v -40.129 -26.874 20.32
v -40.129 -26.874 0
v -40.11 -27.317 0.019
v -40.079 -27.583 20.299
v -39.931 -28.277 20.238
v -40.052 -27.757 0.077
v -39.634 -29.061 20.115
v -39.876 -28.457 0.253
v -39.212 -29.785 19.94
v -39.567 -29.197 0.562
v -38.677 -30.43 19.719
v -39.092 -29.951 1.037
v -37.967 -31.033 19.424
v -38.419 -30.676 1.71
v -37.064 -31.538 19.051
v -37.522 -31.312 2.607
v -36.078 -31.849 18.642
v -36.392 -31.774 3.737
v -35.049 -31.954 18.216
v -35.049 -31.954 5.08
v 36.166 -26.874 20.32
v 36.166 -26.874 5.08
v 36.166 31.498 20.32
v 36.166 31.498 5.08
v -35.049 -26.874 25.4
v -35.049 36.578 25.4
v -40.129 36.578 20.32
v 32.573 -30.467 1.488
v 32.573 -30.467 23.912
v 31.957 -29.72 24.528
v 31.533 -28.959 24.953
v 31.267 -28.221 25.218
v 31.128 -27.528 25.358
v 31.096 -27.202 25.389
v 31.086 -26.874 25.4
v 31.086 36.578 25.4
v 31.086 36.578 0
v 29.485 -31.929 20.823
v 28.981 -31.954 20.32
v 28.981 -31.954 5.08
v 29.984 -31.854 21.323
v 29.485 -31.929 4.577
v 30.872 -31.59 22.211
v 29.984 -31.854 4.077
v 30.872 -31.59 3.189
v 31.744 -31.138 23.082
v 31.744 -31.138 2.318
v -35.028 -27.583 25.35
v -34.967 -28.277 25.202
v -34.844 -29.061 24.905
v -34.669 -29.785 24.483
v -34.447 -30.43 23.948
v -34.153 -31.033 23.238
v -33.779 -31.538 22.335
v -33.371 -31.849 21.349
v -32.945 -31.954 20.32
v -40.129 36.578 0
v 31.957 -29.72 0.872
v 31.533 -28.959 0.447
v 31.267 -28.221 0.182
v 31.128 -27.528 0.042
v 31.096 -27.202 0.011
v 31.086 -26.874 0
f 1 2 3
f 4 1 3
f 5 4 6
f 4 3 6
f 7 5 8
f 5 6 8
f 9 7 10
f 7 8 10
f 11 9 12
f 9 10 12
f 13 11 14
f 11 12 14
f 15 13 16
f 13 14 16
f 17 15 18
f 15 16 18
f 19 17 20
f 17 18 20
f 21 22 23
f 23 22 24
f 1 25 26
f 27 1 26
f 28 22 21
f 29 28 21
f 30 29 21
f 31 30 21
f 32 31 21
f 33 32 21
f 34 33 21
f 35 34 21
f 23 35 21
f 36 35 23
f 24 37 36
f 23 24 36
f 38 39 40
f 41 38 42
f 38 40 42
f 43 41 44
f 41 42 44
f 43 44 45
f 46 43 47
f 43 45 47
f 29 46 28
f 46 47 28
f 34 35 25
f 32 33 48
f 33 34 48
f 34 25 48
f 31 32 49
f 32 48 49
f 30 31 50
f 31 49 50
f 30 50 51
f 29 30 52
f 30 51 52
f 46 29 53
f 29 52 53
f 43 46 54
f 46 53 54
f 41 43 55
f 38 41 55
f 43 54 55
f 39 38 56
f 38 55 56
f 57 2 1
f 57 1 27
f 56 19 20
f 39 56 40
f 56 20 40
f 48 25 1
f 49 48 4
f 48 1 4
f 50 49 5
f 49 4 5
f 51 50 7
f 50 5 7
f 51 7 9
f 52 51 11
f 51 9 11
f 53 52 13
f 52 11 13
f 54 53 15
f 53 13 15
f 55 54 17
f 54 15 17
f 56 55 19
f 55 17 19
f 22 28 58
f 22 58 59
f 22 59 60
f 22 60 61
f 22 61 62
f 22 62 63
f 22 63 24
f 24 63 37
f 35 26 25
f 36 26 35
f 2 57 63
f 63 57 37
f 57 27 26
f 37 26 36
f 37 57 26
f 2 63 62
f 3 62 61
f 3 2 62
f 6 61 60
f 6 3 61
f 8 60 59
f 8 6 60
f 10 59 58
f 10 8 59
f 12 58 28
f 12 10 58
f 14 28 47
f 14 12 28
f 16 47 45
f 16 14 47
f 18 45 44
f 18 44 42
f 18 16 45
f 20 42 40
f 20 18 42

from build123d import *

# Parameters (mm, degrees)
F0_W        = 76.2943662703
F0_H        = 68.5328170657
F1_DEPTH    = 25.4
F2_SIZE     = 5.08
F3_T1_DEPTH = 45.72
F3_T3_DEPTH = 32.5842048969
F3_T5_DEPTH = 96.6143662703
F3_T7_DEPTH = 91.5343662703
F3_T9_DEPTH = 35.9210244843


# Not quite as in the source:
# - a fillet or chamfer that OpenCascade refuses, or shapes differently, is made with other operations: its cross-section is extruded or revolved along the edge and cut away or added


with BuildPart() as f1:
    # F0 (on Top) → F1 (new body)
    with BuildSketch(Plane.XY):
        with Locations((-1.9816737622, 2.3119486868)):
            Rectangle(F0_W, F0_H)
    extrude(amount=F1_DEPTH)

    # F2
    f2_edges = [f1.edges().sort_by_distance(p)[0] for p in [
        (36.165509, -31.95446, 12.7),
        (36.165509, 36.578357, 12.7),
        (36.165509, 2.311949, 0),
        (36.165509, 2.311949, 25.4),
        (-40.128857, 2.311949, 25.4),
    ]]
    chamfer(f2_edges, length=F2_SIZE)

    # F3: fillet of radius 5.08 on 5 edges, made by hand

    # F3_s2 → F3_t1 (cut)
    with BuildSketch(Plane.XY.offset(-12.7)):
        with BuildLine():
            ThreePointArc((-40.1288568974, -26.874459846), (-38.6409593458, -30.4665622944), (-35.0488568974, -31.954459846))
            Line((-35.0488568974, -31.954459846), (-40.1288568974, -31.954459846))
            Line((-40.1288568974, -31.954459846), (-40.1288568974, -26.874459846))
        make_face()
    extrude(amount=F3_T1_DEPTH, mode=Mode.SUBTRACT)

    # F3_s4 → F3_t3 (cut)
    with BuildSketch(Plane(origin=(-18.8846845697, 0, -18.8846845697), x_dir=(0, 1, 0), z_dir=(0.7071067812, 0, 0.7071067812))):
        with BuildLine():
            ThreePointArc((-26.874459846, 42.7437966271), (-30.4665622944, 41.2558990755), (-31.954459846, 37.6637966271))
            Line((-31.954459846, 37.6637966271), (-31.954459846, 42.7437966271))
            Line((-31.954459846, 42.7437966271), (-26.874459846, 42.7437966271))
        make_face()
    extrude(amount=F3_T3_DEPTH, mode=Mode.SUBTRACT)

    # F3_s6 → F3_t5 (cut)
    with BuildSketch(Plane.YZ.offset(-52.8288568974)):
        with BuildLine():
            ThreePointArc((-26.874459846, 0), (-30.4665622944, 1.4878975516), (-31.954459846, 5.08))
            Line((-31.954459846, 5.08), (-31.954459846, 0))
            Line((-31.954459846, 0), (-26.874459846, 0))
        make_face()
    extrude(amount=F3_T5_DEPTH, mode=Mode.SUBTRACT)

    # F3_s8 → F3_t7 (cut)
    with BuildSketch(Plane.YZ.offset(-47.7488568974)):
        with BuildLine():
            ThreePointArc((-26.874459846, 25.4), (-30.4665622944, 23.9121024484), (-31.954459846, 20.32))
            Line((-31.954459846, 20.32), (-31.954459846, 25.4))
            Line((-31.954459846, 25.4), (-26.874459846, 25.4))
        make_face()
    extrude(amount=F3_T7_DEPTH, mode=Mode.SUBTRACT)

    # F3_s10 → F3_t9 (cut)
    with BuildSketch(Plane.XY.offset(-5.2605122421)):
        with BuildLine():
            ThreePointArc((28.9813044761, -31.954459846), (30.9253363125, -31.5677678712), (32.5734069245, -30.4665622944))
            Line((32.5734069245, -30.4665622944), (31.0855093729, -31.954459846))
            Line((31.0855093729, -31.954459846), (28.9813044761, -31.954459846))
        make_face()
    extrude(amount=F3_T9_DEPTH, mode=Mode.SUBTRACT)


solid = f1.part
